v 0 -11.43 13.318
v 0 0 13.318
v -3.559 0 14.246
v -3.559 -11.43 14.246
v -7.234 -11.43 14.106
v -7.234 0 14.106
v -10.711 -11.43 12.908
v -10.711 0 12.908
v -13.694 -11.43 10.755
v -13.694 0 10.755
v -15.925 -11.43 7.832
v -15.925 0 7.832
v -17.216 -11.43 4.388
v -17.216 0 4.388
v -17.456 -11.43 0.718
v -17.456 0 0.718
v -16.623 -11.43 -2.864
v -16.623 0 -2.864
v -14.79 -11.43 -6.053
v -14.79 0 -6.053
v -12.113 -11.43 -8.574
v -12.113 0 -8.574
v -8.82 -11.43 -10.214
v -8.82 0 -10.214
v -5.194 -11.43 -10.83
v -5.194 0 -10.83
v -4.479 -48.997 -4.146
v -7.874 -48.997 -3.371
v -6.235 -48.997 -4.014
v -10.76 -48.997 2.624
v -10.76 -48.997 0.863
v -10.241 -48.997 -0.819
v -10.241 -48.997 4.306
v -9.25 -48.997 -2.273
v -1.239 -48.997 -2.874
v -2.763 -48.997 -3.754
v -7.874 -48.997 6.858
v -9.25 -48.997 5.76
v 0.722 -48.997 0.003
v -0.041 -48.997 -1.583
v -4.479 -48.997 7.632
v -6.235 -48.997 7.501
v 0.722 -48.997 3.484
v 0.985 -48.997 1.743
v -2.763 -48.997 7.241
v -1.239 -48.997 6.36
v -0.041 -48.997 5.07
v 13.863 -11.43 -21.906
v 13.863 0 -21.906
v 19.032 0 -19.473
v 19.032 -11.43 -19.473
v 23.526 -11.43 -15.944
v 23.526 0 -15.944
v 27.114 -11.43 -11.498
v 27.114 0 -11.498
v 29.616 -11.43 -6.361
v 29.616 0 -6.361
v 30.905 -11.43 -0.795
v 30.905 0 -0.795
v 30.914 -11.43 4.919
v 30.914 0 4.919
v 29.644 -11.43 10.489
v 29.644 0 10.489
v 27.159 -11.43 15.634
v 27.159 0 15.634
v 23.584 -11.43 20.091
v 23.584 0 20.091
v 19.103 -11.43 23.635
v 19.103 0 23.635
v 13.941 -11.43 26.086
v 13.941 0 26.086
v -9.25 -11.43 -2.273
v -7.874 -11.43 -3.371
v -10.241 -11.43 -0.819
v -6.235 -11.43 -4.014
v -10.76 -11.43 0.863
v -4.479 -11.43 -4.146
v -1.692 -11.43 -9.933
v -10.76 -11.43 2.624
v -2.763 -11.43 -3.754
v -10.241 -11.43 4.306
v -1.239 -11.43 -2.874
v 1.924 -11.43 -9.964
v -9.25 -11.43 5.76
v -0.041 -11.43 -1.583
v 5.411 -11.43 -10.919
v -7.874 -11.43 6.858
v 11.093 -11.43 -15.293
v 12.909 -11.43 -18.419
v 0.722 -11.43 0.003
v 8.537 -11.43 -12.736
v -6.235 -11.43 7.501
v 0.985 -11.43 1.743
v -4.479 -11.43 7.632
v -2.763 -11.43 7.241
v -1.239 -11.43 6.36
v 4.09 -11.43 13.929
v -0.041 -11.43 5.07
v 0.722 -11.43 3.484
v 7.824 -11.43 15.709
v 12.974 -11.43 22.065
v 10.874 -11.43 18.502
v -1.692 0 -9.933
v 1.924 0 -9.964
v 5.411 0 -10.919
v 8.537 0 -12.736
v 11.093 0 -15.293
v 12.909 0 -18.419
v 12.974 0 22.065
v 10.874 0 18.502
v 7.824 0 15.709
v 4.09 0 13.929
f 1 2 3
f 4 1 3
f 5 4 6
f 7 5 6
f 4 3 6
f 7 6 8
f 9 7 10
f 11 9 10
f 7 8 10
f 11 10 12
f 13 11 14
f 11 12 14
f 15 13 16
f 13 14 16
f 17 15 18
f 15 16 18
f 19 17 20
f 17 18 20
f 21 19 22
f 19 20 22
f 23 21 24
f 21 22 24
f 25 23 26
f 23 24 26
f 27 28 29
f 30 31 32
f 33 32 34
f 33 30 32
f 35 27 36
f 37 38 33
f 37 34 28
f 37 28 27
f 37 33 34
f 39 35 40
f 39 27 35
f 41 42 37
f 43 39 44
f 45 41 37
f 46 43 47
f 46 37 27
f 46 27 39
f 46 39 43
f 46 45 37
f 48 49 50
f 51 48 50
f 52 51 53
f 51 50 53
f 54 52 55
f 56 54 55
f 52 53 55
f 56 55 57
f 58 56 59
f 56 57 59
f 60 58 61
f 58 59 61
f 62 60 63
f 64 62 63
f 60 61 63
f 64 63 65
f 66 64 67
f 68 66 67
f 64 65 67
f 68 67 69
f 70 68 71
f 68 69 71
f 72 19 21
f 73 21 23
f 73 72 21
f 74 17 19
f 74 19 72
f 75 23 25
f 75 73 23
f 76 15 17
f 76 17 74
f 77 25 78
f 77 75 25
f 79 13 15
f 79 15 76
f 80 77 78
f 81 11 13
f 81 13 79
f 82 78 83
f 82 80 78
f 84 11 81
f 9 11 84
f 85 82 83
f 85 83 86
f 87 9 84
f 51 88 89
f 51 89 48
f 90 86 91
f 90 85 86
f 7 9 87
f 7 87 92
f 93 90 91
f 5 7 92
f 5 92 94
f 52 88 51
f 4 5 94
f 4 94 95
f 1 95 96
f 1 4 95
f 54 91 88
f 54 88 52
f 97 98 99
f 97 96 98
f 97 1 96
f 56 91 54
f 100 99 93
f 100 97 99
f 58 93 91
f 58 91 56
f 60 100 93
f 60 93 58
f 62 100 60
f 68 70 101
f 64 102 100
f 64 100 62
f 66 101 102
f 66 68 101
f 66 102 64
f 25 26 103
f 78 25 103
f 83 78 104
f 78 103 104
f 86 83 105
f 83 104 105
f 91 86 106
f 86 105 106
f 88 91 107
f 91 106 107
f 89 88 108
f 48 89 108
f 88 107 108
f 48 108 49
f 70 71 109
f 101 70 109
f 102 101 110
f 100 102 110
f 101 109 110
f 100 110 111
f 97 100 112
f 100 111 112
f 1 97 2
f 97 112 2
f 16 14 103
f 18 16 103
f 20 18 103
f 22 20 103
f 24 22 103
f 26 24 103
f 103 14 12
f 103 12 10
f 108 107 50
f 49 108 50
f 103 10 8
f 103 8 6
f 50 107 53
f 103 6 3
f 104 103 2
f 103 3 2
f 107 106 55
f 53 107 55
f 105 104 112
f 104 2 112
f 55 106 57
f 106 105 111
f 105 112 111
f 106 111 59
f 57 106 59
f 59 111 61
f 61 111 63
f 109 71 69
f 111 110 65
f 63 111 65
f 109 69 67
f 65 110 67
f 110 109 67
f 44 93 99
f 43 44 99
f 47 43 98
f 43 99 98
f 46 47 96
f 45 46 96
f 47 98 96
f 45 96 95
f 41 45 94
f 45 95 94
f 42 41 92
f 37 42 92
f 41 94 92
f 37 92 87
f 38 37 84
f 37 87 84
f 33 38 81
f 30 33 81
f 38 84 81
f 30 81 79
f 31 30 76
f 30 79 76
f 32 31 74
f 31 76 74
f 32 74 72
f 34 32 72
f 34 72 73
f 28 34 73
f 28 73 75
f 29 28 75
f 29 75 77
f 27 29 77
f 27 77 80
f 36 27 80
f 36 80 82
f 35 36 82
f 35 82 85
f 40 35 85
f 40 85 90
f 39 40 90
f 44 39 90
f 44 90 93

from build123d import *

# Parameters (mm, degrees)
F0_R     = 5.9055
F1_DEPTH = 11.43
F2_DEPTH = 48.9966


with BuildPart() as f1:
    # F0 (on Front) → F1 (new body)
    with BuildSketch(Plane.XZ):
        with BuildLine():
            ThreePointArc((-5.19436, -10.830459), (7.032524, -11.726022), (13.86311, -21.906485))
            ThreePointArc((13.86311, -21.906485), (31.07098, 2.06154), (13.941479, 26.085635))
            ThreePointArc((13.941479, 26.085635), (9.452353, 16.991928), (0, 13.317586))
            ThreePointArc((0, 13.317586), (-17.216361, 4.38822), (-5.19436, -10.830459))
        make_face()
        with Locations((-4.920786, 1.743383)):
            Circle(F0_R, mode=Mode.SUBTRACT)
    extrude(amount=F1_DEPTH)

    # F0 (on Front) → F2 (join)
    with BuildSketch(Plane.XZ):
        with Locations((-4.920786, 1.743383)):
            Circle(F0_R)
    extrude(amount=F2_DEPTH)


solid = f1.part
